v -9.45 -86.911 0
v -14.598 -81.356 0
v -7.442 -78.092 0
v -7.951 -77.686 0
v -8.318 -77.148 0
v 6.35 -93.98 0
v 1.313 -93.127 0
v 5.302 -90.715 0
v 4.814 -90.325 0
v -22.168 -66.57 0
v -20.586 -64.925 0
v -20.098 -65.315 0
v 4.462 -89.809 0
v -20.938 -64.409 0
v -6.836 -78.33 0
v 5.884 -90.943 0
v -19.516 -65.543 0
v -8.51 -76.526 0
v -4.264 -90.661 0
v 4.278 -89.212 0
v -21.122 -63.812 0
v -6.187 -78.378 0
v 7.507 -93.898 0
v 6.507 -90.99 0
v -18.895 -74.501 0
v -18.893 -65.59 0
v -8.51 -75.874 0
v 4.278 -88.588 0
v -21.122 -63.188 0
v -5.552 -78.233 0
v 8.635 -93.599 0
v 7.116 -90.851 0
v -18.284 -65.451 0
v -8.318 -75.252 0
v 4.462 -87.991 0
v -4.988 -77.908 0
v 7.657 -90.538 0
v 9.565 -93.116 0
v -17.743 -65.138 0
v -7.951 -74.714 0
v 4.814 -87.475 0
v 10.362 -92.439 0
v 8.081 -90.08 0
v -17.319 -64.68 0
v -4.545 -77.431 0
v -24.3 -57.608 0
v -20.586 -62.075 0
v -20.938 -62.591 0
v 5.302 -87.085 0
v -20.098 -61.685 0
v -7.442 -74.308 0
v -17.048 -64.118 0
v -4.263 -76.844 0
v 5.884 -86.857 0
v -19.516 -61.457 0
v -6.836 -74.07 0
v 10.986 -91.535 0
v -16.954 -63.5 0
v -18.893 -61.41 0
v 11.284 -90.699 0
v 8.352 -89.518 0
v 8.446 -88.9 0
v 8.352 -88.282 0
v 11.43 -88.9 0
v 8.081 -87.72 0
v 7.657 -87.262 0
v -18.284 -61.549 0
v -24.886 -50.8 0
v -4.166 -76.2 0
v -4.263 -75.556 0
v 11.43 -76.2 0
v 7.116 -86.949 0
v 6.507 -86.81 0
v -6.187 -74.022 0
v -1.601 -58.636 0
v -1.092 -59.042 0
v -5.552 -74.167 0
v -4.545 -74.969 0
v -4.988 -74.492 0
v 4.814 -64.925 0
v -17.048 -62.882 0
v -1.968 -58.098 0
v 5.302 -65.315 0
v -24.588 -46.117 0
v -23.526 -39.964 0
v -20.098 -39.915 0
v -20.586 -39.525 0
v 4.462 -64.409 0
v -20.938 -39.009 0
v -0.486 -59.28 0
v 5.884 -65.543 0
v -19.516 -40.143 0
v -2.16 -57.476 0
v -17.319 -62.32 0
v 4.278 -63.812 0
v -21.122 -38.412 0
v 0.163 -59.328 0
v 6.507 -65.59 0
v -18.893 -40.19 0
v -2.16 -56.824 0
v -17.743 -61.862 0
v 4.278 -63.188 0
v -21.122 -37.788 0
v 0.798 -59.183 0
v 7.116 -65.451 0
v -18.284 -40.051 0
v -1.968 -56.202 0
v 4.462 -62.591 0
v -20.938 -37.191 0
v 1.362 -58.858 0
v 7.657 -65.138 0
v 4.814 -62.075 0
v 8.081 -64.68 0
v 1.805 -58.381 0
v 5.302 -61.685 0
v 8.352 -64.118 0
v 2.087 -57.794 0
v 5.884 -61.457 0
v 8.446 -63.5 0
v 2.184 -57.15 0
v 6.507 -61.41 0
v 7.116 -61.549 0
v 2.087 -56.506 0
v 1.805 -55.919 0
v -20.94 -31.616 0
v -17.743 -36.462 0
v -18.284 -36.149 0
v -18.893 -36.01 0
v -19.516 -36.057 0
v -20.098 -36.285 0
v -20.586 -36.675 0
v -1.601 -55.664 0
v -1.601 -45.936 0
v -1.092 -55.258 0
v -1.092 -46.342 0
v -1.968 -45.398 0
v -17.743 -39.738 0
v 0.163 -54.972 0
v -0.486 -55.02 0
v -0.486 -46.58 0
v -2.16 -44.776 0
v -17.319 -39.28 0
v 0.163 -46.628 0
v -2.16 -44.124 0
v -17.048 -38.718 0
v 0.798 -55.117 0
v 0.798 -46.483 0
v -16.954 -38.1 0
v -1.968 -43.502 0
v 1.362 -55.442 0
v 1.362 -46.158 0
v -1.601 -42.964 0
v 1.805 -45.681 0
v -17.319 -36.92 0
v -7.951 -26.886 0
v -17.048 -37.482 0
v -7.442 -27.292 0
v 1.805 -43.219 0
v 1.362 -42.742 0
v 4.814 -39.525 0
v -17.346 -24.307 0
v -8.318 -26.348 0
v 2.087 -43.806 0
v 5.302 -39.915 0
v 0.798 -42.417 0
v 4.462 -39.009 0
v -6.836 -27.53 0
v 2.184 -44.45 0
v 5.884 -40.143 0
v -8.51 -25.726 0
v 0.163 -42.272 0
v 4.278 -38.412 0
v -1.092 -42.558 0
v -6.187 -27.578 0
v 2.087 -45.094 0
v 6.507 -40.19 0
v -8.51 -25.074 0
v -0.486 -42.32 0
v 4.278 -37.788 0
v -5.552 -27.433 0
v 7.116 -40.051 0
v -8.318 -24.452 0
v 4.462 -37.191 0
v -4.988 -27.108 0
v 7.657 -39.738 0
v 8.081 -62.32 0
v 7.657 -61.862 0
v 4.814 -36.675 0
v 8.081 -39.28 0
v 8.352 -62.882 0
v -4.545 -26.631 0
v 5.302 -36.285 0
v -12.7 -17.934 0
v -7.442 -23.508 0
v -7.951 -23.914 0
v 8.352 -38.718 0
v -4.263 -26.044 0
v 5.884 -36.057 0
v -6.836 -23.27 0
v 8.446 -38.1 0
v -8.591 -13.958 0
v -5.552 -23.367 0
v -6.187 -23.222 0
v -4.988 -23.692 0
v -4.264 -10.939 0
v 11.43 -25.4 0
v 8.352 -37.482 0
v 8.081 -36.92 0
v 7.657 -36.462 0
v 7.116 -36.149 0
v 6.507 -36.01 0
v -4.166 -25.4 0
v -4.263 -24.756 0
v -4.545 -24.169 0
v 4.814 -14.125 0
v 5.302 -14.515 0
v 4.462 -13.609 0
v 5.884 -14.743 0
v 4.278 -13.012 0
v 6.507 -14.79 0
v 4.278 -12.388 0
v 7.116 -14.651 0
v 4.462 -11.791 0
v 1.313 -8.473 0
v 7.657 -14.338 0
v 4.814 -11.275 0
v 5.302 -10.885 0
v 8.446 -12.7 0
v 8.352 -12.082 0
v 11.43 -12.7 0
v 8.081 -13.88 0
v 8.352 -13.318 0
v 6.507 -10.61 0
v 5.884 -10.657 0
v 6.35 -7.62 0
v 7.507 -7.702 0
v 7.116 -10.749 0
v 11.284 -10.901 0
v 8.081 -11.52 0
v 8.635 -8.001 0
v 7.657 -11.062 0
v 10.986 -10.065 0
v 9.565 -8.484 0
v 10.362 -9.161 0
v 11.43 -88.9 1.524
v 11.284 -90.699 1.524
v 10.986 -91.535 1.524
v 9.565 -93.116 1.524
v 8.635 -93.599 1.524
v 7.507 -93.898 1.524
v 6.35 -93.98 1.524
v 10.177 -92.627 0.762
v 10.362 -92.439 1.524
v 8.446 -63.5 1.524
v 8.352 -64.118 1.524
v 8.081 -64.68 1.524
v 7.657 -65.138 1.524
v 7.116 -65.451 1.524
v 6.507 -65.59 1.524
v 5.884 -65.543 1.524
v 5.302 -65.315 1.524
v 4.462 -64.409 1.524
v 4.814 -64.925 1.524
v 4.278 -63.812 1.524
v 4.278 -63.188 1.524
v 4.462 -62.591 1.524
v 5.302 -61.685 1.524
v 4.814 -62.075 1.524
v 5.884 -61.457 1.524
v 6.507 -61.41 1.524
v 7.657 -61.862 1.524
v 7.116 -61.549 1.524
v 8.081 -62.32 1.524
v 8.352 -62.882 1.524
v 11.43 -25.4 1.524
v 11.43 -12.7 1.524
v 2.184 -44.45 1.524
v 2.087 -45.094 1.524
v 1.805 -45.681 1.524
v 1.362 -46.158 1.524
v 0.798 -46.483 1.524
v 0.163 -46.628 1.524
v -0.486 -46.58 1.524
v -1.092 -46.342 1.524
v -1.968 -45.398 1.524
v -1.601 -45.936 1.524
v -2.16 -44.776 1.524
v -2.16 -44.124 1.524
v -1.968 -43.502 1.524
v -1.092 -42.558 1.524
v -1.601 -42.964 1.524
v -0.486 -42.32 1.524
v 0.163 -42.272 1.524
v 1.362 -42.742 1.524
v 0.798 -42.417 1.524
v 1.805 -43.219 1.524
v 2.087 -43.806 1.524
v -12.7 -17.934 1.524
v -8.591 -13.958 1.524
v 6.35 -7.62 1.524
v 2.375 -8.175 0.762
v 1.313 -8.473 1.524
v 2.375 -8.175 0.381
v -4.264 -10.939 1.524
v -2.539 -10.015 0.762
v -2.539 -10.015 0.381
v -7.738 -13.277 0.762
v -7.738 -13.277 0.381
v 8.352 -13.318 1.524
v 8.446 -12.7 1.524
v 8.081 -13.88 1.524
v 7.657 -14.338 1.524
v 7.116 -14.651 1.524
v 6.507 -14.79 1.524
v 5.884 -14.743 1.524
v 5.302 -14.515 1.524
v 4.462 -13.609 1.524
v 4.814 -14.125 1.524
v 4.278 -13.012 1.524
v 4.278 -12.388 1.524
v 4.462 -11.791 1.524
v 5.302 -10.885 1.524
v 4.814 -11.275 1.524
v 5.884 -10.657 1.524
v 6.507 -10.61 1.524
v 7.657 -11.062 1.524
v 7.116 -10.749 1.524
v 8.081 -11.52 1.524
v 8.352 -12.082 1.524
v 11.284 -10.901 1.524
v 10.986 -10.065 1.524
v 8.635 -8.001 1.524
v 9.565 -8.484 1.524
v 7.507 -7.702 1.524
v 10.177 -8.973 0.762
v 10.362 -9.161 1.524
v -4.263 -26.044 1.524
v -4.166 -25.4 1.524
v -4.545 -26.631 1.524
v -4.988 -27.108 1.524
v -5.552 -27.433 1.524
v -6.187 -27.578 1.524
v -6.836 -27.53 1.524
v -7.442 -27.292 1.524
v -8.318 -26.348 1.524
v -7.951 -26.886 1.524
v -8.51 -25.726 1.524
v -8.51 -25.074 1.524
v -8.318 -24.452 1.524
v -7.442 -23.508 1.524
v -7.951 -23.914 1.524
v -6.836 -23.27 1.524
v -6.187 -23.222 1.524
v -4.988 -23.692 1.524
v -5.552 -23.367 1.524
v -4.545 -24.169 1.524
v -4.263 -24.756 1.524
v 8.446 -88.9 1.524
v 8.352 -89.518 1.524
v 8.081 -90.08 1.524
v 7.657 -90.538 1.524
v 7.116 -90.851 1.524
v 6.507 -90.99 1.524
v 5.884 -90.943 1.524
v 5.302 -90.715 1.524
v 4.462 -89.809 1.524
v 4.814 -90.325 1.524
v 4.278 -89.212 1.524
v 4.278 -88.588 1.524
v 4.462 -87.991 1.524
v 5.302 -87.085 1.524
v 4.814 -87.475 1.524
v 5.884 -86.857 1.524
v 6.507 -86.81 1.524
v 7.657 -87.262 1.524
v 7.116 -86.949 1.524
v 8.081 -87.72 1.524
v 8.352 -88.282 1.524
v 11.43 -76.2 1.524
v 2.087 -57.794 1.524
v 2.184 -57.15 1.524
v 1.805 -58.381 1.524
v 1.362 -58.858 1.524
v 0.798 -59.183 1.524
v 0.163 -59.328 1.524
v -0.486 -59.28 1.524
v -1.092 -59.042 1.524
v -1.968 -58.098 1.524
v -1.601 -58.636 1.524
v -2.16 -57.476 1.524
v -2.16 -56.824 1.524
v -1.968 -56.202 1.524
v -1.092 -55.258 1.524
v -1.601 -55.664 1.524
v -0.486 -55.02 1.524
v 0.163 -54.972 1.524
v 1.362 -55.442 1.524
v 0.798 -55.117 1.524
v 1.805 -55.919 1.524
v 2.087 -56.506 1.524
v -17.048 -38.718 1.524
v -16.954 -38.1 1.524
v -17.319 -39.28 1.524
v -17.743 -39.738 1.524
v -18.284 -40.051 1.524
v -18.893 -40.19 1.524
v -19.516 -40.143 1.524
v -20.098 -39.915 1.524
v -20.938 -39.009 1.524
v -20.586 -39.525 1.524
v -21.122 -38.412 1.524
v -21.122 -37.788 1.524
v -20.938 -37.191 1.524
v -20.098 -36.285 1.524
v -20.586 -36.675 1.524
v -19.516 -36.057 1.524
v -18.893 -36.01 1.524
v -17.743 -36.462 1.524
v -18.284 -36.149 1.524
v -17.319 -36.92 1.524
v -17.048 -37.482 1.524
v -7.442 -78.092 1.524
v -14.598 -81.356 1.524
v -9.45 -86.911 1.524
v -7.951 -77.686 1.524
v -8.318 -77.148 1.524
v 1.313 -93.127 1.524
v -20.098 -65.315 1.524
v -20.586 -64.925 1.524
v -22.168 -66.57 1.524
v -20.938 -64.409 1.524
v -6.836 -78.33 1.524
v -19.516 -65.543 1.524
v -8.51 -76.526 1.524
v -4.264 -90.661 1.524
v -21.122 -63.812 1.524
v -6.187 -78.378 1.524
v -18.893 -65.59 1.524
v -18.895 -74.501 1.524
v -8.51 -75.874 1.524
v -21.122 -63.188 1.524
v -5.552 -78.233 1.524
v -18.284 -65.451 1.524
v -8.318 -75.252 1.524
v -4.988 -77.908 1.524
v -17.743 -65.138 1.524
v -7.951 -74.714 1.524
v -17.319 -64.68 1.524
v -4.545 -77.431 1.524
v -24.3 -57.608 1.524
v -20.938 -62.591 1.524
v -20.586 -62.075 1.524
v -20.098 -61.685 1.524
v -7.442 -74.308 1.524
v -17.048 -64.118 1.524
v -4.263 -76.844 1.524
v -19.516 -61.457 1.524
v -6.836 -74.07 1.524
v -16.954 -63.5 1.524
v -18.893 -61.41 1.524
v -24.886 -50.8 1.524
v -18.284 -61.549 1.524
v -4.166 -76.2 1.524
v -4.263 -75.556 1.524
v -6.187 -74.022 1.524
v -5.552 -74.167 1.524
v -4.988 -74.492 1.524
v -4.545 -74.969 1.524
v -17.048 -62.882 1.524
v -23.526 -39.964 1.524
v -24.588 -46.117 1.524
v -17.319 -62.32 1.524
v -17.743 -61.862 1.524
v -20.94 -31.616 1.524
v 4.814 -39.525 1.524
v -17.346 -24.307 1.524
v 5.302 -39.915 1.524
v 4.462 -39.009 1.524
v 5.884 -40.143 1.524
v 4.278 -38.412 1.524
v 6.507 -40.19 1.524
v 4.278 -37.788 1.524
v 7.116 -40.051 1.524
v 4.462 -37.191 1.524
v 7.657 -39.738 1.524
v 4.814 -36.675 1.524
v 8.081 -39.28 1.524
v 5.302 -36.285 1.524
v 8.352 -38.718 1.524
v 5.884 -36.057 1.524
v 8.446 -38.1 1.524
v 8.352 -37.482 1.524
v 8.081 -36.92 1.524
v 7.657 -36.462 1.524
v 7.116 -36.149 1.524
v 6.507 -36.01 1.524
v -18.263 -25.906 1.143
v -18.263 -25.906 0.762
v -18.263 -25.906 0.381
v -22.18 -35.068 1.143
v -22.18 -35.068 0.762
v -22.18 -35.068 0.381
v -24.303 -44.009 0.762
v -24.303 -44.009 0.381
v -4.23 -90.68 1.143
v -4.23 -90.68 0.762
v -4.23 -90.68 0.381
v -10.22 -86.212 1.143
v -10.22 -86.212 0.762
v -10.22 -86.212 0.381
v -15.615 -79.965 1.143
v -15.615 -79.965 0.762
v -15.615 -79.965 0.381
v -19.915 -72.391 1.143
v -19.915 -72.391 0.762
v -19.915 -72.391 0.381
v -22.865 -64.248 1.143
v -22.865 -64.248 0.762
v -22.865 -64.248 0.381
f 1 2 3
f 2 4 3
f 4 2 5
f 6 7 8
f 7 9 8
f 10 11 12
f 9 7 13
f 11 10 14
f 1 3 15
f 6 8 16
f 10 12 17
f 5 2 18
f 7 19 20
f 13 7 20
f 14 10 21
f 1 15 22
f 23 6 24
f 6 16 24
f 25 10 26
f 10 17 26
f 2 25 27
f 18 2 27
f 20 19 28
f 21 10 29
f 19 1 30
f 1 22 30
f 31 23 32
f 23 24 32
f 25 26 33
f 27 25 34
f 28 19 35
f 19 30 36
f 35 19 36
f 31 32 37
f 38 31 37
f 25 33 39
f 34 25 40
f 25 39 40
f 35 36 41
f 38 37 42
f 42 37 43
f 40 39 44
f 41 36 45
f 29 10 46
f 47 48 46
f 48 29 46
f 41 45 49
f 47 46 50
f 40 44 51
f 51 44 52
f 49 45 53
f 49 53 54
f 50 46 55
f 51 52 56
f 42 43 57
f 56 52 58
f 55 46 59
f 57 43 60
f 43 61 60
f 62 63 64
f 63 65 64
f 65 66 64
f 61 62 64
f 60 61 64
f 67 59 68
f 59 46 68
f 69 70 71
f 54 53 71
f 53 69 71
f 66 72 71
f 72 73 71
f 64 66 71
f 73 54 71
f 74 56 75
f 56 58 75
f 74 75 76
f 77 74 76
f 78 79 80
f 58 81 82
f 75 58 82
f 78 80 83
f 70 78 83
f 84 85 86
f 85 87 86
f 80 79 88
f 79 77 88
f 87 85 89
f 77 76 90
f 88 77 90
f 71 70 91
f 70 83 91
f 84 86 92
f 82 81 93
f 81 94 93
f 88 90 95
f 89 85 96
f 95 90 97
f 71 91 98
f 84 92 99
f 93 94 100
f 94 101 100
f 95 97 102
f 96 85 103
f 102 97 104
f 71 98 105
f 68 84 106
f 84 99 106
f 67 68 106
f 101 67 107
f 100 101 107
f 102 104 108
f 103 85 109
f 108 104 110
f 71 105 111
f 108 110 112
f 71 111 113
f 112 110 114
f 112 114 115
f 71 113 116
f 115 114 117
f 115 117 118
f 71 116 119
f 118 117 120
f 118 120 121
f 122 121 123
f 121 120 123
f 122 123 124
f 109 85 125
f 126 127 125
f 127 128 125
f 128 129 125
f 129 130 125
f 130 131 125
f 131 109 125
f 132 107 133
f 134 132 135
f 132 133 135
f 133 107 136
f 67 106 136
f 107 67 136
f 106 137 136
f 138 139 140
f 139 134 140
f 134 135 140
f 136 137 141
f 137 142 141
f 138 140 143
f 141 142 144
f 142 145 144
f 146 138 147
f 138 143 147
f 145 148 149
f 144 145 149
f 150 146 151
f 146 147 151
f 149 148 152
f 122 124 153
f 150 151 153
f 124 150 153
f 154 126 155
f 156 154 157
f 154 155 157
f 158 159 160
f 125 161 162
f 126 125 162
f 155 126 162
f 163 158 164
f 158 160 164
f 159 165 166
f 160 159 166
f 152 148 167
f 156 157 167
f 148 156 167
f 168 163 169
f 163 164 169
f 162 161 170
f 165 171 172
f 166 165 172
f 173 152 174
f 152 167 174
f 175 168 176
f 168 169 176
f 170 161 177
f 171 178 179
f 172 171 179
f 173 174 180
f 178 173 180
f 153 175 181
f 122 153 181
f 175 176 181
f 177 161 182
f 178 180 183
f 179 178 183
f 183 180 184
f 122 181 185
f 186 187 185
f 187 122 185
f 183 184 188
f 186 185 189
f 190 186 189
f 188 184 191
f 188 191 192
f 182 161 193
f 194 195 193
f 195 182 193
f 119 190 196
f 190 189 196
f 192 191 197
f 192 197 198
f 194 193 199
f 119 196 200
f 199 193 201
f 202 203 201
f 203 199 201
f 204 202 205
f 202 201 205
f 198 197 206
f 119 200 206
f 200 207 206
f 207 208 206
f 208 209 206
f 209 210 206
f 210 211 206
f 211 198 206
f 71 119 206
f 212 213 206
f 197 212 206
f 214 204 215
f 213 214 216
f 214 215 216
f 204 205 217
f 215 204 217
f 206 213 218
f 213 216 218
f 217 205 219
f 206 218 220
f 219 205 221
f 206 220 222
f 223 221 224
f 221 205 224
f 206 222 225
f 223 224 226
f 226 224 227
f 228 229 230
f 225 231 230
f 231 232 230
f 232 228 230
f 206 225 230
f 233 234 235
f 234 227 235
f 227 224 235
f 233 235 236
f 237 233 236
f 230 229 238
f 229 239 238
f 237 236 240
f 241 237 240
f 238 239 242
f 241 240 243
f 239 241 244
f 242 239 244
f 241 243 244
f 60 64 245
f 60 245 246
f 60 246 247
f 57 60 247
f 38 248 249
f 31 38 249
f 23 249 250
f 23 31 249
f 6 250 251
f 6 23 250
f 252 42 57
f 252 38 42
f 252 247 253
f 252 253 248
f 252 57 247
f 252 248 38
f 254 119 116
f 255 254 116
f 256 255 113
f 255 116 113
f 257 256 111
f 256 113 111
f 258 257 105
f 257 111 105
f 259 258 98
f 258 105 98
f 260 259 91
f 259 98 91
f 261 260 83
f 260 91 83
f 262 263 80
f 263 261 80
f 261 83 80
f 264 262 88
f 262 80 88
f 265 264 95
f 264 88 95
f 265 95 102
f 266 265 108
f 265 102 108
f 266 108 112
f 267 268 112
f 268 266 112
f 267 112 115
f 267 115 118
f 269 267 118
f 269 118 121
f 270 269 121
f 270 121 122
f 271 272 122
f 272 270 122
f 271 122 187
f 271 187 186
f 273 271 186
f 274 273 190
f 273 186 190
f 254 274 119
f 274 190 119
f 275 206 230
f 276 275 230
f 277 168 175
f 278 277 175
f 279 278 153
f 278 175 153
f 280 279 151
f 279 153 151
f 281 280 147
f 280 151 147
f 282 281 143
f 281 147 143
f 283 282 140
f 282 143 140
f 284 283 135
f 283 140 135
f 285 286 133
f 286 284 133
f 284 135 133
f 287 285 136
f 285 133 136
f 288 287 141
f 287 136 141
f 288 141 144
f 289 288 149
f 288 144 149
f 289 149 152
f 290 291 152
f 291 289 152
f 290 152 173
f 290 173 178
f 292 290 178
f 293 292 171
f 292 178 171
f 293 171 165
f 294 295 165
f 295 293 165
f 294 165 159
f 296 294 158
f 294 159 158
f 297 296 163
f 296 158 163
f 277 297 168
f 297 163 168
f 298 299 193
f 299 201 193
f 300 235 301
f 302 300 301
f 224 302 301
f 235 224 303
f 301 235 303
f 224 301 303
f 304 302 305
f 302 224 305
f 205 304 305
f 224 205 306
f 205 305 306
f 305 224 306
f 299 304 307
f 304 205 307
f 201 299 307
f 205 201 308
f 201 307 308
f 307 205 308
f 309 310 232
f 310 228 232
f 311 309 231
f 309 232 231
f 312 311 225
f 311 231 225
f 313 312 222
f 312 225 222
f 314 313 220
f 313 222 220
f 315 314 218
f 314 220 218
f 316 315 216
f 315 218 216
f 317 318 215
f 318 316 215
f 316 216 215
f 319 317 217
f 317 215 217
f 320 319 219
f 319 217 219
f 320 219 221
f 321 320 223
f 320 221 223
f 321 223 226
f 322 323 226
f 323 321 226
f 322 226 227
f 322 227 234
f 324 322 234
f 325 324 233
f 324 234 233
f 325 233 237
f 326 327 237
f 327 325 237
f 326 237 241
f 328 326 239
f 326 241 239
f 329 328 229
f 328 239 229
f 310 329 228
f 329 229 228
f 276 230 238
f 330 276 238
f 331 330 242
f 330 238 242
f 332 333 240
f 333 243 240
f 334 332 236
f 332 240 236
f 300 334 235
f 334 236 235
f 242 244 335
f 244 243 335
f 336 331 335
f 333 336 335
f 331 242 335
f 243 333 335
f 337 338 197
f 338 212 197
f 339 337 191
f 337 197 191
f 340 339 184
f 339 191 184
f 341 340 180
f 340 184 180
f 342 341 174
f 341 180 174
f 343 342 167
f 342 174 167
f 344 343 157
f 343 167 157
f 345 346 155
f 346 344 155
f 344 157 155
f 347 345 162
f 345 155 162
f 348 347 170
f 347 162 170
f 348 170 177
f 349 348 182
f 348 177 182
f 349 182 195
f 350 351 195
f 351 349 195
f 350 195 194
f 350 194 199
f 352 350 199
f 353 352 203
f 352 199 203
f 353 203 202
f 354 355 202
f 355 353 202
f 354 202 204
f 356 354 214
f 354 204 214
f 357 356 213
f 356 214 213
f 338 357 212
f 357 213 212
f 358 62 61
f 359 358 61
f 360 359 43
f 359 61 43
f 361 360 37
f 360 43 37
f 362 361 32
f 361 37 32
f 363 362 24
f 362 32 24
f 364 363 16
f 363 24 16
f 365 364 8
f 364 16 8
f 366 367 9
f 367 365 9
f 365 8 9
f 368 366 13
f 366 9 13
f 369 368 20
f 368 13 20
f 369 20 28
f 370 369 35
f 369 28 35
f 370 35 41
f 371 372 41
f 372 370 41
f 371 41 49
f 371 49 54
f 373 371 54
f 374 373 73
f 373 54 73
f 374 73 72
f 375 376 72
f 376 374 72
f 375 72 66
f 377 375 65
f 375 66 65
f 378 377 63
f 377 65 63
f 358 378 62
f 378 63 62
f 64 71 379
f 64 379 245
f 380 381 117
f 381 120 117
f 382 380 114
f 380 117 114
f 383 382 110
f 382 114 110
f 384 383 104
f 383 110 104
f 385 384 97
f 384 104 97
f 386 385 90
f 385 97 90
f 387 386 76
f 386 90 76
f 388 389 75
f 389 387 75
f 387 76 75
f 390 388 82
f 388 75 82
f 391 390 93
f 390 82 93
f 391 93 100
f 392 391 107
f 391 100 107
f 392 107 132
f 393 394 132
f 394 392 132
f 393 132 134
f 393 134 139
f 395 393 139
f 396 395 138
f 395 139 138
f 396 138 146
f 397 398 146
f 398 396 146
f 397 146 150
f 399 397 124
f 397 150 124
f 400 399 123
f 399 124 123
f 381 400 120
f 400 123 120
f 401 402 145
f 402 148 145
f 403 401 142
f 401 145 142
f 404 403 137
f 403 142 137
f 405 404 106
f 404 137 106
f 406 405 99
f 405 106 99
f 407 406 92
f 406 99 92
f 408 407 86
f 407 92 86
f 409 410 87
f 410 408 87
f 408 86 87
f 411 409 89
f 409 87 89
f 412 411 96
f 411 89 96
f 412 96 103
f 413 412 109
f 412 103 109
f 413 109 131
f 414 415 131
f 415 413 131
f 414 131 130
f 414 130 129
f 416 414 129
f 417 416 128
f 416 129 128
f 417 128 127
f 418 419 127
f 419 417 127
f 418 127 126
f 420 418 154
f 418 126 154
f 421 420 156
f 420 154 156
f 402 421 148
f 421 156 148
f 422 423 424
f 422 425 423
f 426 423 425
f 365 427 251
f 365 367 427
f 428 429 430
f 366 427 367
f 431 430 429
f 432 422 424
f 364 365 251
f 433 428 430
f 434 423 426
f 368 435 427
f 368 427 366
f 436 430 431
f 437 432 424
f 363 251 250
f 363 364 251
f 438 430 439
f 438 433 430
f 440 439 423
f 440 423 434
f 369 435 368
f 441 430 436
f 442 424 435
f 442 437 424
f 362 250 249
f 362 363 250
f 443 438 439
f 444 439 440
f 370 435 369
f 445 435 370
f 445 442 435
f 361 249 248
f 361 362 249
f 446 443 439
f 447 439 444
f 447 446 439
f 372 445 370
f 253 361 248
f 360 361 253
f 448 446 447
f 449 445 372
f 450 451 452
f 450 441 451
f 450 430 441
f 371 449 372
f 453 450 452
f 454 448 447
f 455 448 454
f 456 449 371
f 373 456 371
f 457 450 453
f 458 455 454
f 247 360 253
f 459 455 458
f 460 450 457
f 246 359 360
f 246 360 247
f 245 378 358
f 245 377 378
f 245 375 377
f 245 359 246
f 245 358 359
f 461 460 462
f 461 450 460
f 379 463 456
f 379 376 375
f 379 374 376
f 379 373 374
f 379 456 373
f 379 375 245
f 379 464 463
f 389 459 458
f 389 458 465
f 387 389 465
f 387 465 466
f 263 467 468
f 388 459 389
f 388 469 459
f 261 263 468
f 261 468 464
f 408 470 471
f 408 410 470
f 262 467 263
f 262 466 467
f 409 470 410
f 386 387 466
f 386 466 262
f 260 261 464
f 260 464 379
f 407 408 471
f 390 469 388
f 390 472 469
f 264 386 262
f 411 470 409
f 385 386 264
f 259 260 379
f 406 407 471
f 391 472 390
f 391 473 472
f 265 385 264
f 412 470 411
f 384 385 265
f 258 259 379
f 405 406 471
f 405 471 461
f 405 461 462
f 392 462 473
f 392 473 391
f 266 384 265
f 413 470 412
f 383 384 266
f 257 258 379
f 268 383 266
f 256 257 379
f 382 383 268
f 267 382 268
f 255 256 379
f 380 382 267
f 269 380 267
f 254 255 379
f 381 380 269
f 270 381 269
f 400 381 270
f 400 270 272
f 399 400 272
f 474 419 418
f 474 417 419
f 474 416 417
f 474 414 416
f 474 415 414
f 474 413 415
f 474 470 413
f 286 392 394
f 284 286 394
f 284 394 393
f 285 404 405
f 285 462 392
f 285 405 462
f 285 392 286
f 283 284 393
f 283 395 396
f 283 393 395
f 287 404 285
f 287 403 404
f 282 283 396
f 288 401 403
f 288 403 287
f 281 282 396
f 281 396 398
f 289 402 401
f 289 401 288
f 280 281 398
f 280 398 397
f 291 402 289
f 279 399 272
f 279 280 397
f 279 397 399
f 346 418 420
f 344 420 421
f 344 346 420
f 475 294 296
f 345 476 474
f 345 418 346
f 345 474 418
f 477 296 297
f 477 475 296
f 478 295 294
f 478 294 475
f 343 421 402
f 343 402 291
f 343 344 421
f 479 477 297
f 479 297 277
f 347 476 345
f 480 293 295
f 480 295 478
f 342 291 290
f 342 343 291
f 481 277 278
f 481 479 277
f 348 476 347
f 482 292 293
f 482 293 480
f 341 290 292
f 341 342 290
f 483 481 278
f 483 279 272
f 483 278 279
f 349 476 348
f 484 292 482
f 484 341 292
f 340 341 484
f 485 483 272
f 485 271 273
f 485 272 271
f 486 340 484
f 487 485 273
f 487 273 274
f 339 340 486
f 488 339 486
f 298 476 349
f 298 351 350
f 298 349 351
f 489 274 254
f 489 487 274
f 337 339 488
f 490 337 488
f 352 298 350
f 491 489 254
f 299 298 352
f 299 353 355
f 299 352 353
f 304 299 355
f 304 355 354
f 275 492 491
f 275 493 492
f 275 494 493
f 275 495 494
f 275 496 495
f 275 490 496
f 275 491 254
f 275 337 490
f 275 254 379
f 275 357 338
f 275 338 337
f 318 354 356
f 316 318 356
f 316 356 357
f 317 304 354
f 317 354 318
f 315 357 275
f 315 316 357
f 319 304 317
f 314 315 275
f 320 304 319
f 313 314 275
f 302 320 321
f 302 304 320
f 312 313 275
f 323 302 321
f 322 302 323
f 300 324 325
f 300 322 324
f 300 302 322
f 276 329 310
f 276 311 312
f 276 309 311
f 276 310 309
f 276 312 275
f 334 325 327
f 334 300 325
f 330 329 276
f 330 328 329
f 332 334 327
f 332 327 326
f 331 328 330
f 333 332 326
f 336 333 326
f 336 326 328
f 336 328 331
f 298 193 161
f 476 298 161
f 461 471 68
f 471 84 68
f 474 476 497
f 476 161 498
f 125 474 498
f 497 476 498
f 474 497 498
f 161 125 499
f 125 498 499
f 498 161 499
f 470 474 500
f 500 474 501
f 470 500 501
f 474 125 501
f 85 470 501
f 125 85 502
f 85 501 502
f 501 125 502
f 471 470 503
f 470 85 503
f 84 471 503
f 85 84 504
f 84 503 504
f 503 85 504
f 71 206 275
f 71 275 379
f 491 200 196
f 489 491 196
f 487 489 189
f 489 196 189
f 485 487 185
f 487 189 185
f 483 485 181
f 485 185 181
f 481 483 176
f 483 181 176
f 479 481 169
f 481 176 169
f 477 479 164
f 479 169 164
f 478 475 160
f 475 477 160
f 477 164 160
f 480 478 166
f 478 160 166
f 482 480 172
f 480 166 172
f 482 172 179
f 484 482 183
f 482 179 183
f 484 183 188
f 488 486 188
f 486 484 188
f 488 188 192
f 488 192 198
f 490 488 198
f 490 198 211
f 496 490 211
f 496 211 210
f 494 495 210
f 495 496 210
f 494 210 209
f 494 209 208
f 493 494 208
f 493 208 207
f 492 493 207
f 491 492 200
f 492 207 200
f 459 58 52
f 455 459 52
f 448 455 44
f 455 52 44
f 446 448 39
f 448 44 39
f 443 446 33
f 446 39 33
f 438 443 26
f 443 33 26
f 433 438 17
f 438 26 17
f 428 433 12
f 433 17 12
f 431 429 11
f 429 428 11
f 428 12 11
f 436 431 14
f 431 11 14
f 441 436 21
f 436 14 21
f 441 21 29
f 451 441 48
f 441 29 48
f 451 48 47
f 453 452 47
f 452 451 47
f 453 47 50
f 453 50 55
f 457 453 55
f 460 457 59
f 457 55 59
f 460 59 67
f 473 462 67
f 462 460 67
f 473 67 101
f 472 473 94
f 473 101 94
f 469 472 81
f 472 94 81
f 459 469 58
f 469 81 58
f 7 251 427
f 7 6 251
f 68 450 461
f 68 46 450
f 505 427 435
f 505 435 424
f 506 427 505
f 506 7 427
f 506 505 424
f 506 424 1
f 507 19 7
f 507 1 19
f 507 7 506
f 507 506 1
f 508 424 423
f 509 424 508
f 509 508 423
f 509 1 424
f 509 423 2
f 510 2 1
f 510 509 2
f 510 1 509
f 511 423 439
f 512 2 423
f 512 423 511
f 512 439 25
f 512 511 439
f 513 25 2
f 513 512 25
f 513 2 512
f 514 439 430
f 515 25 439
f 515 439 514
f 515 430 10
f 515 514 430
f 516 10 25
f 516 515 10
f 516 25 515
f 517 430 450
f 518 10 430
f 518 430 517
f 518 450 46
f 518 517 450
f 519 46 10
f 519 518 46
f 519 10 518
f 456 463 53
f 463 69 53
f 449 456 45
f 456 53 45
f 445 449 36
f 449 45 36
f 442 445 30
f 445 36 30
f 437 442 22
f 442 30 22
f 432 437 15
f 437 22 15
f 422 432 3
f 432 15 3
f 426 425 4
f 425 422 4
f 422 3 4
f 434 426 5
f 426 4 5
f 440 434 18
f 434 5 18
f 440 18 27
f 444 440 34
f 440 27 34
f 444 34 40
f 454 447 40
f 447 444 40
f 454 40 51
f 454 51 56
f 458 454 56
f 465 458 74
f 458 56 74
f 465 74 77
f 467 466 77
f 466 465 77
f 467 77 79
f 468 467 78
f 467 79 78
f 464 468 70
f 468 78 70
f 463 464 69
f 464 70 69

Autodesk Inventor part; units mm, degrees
ref_plane "YZ Plane" through (0, 0, 0) normal (1, 0, 0) x (0, 1, 0)
ref_plane "XZ Plane" through (0, 0, 0) normal (0, 1, 0) x (-1, 0, 0)
ref_plane "XY Plane" through (0, 0, 0) normal (0, 0, 1) x (1, 0, 0)
sketch "Sketch1" plane through (0, 0, 0) normal (0, 0, 1) x (1, 0, 0)
  line L0 (11.43, -25.4) -> (11.43, -76.2)
  circle A0 centre (6.35, -38.1) radius 2.0955
  circle A1 centre (6.35, -63.5) radius 2.0955
  line L1 (11.43, -76.2) -> (11.43, -88.9)
  line L2 (11.43, -25.4) -> (11.43, -12.7)
  circle A2 centre (6.35, -12.7) radius 2.0955
  circle A3 centre (6.35, -88.9) radius 2.0955
  line L3 (6.35, -38.1) -> (6.35, -63.5) construction
  line L4 (6.35, -50.8) -> (8.4455, -50.8) construction
  line L5 (6.35, -7.62) -> (-1.2208, -7.62) construction
  line L6 (-1.2208, -7.62) -> (-21.1455, -14.7955) construction
  line L7 (-21.1455, -14.7955) -> (-24.8856, -42.1223) construction
  line L8 (-24.8856, -42.1223) -> (-24.8856, -50.8) construction
  spline S0 degree 4 poles (6.35, -7.62) (-1.2208, -7.62) (-21.1455, -14.7955) (-24.8856, -42.1223) (-24.8856, -50.8) knots 1 1 1 1 1 2 2 2 2 2
  line L9 (6.35, -93.98) -> (-1.2208, -93.98) construction
  line L10 (-1.2208, -93.98) -> (-21.1455, -86.8045) construction
  line L11 (-21.1455, -86.8045) -> (-24.8856, -59.4777) construction
  line L12 (-24.8856, -59.4777) -> (-24.8856, -50.8) construction
  spline S1 degree 4 poles (6.35, -93.98) (-1.2208, -93.98) (-21.1455, -86.8045) (-24.8856, -59.4777) (-24.8856, -50.8) knots 1 1 1 1 1 2 2 2 2 2
  spline S2 degree 4 poles (11.43, -12.7) (11.43, -11.6705) (11.43, -9.6114) (9.4386, -7.8854) (7.3795, -7.62) (6.35, -7.62) knots 0 0 0 0 0 0.5 1 1 1 1 1
  spline S3 degree 4 poles (11.43, -88.9) (11.43, -89.9295) (11.43, -91.9886) (9.4386, -93.7146) (7.3795, -93.98) (6.35, -93.98) knots 0 0 0 0 0 0.5 1 1 1 1 1
  circle A4 centre (-6.35, -25.4) radius 2.1844 projected
  circle A5 centre (-6.35, -76.2) radius 2.1844 projected
  circle A6 centre (0, -44.45) radius 2.1844 projected
  circle A7 centre (0, -57.15) radius 2.1844 projected
  line L13 (-12.7, -30.6578) -> (-12.7, 30.8102) projected
  circle A8 centre (-19.05, -38.1) radius 2.0955
  circle A9 centre (-19.05, -63.5) radius 2.0955
  point P0 (0, 0)
  dimension "d2" = 4.191
  dimension "d3" = 4.191
  dimension "d4" = 12.7
  dimension "d5" = 4.191
  dimension "d6" = 4.191
  dimension "d9" = 4.191
  dimension "d10" = 6.35
  dimension "d12" = 0
  dimension "d13" = 4.191
  dimension "d14" = 0
  dimension "d15" = 0
extrude "Extrusion2" add sketch "Sketch1" along normal blind 1.524
properties part number "shaft-retainer-v2"
